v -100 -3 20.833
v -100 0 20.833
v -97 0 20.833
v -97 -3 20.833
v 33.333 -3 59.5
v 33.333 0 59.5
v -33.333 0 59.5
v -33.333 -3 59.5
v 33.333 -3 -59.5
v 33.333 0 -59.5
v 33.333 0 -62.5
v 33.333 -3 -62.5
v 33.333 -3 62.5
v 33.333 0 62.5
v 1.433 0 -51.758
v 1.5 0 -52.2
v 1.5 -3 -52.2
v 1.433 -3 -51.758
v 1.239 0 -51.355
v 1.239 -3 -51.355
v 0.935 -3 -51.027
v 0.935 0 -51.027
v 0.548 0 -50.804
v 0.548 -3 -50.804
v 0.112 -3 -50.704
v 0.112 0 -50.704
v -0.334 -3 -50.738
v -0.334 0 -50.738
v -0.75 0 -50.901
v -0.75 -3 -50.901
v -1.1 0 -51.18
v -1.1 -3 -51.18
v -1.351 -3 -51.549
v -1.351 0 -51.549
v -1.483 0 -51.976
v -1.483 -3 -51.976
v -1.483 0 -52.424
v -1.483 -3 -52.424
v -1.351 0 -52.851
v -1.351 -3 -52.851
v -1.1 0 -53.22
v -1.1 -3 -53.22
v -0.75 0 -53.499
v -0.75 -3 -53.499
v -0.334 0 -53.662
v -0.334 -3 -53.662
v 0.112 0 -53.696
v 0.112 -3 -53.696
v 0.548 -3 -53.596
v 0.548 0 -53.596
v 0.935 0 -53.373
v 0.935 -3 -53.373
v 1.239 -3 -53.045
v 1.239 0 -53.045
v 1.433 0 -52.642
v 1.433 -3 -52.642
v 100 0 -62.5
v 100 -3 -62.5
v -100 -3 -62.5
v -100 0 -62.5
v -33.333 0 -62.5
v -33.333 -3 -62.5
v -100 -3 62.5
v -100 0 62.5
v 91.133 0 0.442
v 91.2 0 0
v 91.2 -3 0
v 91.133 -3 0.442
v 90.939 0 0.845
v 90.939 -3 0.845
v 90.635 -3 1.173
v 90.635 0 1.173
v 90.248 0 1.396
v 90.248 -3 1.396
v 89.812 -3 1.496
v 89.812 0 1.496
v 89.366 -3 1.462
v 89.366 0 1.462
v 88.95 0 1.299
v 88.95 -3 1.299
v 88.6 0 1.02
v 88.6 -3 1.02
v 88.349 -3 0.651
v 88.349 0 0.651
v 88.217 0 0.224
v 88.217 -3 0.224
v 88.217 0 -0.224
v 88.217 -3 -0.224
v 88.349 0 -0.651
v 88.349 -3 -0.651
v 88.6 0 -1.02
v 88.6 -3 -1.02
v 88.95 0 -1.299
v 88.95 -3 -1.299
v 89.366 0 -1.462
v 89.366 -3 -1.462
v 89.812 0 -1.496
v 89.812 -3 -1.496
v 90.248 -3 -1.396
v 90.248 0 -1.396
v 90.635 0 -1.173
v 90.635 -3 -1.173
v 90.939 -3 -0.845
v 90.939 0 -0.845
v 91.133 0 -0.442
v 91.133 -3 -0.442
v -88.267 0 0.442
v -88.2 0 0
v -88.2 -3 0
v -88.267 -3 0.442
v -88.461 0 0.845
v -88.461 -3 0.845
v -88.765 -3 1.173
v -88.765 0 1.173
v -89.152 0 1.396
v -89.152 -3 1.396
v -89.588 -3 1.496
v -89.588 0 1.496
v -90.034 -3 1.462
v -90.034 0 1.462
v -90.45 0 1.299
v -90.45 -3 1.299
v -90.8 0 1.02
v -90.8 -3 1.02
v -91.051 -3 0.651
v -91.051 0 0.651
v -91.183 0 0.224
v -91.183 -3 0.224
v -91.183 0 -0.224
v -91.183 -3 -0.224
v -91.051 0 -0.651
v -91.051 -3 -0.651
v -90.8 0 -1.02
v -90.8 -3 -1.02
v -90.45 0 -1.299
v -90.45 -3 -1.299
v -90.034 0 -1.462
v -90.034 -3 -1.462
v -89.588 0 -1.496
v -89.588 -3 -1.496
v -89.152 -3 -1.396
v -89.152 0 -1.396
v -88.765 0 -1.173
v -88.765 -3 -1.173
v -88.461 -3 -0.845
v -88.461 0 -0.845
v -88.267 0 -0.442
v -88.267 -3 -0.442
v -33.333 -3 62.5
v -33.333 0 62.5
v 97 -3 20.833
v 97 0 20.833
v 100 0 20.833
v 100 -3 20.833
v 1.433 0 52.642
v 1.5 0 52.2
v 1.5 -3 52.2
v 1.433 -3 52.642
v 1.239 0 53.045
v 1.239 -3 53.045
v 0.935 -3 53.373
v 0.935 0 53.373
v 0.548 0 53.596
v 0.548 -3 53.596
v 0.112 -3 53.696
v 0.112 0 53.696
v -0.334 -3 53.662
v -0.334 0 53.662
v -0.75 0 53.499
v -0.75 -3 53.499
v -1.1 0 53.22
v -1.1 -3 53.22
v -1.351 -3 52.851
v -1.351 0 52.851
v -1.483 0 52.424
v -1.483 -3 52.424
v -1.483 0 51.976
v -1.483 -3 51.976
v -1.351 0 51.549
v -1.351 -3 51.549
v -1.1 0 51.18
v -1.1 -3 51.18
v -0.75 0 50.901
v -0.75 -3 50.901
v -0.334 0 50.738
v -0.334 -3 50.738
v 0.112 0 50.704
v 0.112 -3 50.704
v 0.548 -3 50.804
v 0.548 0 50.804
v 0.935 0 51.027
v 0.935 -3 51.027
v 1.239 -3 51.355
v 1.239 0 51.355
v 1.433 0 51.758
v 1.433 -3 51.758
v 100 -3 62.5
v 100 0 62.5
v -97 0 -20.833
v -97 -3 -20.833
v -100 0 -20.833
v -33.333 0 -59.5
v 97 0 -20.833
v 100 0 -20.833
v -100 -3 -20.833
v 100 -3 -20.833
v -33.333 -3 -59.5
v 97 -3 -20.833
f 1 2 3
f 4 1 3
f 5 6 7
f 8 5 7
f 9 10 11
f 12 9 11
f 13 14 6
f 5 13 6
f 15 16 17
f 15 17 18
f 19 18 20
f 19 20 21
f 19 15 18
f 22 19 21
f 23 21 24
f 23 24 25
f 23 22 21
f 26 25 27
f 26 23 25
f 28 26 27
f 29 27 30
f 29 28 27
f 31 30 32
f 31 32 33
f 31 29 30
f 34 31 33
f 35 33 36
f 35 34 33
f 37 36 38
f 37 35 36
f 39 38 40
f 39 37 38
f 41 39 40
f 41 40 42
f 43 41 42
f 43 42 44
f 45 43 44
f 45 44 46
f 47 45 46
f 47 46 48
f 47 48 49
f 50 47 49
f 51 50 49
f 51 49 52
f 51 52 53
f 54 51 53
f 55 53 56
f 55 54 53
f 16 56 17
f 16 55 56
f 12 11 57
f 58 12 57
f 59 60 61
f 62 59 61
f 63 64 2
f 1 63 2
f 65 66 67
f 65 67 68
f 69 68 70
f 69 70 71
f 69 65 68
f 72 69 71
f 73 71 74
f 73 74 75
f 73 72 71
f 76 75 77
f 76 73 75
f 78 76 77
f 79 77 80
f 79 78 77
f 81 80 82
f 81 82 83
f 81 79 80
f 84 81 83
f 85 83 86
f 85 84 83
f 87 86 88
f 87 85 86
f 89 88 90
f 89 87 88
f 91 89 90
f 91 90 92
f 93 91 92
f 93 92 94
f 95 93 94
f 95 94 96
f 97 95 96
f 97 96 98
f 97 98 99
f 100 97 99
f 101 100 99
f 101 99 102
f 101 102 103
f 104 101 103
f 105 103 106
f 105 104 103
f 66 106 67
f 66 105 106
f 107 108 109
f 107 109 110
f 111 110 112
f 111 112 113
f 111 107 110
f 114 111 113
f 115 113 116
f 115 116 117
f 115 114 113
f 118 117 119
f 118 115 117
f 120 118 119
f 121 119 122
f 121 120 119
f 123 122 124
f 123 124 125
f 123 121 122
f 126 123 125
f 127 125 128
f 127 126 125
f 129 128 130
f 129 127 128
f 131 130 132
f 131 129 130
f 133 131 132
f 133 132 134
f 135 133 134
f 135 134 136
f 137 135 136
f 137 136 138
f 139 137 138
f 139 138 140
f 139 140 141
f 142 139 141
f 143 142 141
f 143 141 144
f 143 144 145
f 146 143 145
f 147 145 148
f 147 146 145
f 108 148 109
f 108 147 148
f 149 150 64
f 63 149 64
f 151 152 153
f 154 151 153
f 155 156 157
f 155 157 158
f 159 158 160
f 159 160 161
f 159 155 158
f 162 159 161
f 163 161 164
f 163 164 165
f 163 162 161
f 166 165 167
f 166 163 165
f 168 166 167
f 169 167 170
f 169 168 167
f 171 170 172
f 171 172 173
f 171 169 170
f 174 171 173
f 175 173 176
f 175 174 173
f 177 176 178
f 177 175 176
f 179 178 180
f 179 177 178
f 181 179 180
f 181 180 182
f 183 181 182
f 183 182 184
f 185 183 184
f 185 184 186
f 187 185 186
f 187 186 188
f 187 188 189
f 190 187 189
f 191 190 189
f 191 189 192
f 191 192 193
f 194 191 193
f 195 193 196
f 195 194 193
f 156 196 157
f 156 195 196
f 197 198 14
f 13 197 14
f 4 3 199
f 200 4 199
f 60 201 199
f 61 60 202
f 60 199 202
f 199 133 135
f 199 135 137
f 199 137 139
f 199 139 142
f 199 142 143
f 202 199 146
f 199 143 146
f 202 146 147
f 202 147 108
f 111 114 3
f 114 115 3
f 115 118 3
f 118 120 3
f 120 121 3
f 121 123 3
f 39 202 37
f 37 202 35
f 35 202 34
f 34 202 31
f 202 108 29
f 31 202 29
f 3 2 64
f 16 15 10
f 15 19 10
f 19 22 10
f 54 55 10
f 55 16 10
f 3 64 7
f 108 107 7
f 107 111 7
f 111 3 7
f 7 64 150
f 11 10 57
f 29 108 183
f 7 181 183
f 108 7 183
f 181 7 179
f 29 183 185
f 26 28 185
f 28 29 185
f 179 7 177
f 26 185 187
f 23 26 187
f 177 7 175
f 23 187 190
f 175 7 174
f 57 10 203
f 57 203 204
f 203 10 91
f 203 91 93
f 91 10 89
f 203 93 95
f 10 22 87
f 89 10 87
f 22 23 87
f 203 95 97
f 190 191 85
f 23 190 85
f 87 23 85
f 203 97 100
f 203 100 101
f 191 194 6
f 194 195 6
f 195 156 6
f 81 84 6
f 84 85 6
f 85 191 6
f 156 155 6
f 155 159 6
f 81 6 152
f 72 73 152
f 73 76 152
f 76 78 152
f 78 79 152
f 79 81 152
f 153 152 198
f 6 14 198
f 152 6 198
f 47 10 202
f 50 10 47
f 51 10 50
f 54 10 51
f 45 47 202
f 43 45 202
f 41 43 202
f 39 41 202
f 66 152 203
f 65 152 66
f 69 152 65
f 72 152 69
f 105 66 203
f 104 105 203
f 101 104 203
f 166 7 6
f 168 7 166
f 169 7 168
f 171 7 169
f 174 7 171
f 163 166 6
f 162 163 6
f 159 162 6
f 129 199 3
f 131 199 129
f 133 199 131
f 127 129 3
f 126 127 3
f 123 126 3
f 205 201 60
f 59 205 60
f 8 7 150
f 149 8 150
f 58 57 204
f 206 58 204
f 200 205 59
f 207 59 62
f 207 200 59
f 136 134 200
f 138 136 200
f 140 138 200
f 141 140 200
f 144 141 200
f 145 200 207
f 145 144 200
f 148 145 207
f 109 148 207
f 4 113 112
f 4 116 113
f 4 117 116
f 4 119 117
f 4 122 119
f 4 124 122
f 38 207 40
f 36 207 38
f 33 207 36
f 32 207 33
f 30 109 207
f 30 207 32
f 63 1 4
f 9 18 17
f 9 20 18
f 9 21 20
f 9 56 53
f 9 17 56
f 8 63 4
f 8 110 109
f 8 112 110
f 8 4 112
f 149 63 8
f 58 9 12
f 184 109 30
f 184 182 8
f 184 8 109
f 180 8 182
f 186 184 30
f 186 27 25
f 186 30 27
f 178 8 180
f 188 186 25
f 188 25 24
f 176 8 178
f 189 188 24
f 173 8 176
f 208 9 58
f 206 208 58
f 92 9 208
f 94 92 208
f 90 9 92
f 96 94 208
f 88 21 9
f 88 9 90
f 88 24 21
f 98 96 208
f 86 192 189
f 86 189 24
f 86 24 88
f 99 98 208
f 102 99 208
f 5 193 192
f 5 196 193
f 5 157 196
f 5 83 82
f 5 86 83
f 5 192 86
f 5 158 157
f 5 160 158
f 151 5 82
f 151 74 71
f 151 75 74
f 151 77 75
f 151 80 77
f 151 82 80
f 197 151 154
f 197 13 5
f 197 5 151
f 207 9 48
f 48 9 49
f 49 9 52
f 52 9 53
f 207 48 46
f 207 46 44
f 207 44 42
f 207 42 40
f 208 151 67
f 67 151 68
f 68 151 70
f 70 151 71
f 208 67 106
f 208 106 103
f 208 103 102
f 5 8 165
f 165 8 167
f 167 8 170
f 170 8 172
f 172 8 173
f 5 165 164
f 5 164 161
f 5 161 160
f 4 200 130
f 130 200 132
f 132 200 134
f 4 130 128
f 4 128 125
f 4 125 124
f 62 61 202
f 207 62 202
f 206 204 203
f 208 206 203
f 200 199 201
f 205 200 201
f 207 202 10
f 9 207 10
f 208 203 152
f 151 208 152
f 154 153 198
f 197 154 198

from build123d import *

# Parameters (mm, degrees)
F0_R     = 1.5
F1_DEPTH = 3


with BuildPart() as f1:
    # F0 (on Front) → F1 (new body)
    with BuildSketch(Plane.XZ):
        Polygon((-100, -20.833333), (-100, -62.5), (-33.333333, -62.5), (-33.333333, -59.5), (33.333333, -59.5), (33.333333, -62.5), (100, -62.5), (100, -20.833333), (97, -20.833333), (97, 20.833333), (100, 20.833333), (100, 62.5), (33.333333, 62.5), (33.333333, 59.5), (-33.333333, 59.5), (-33.333333, 62.5), (-100, 62.5), (-100, 20.833333), (-97, 20.833333), (-97, -20.833333), align=None)
        with Locations((0, -52.2)):
            Circle(F0_R, mode=Mode.SUBTRACT)
        with Locations((-89.7, 0)):
            Circle(F0_R, mode=Mode.SUBTRACT)
        with Locations((89.7, 0)):
            Circle(F0_R, mode=Mode.SUBTRACT)
        with Locations((0, 52.2)):
            Circle(F0_R, mode=Mode.SUBTRACT)
    extrude(amount=F1_DEPTH)


with BuildPart() as f2_1:
    # F2: copy of F1
    add(f1.part.moved(Location((0, 60, 0))))


solid = f1.part
